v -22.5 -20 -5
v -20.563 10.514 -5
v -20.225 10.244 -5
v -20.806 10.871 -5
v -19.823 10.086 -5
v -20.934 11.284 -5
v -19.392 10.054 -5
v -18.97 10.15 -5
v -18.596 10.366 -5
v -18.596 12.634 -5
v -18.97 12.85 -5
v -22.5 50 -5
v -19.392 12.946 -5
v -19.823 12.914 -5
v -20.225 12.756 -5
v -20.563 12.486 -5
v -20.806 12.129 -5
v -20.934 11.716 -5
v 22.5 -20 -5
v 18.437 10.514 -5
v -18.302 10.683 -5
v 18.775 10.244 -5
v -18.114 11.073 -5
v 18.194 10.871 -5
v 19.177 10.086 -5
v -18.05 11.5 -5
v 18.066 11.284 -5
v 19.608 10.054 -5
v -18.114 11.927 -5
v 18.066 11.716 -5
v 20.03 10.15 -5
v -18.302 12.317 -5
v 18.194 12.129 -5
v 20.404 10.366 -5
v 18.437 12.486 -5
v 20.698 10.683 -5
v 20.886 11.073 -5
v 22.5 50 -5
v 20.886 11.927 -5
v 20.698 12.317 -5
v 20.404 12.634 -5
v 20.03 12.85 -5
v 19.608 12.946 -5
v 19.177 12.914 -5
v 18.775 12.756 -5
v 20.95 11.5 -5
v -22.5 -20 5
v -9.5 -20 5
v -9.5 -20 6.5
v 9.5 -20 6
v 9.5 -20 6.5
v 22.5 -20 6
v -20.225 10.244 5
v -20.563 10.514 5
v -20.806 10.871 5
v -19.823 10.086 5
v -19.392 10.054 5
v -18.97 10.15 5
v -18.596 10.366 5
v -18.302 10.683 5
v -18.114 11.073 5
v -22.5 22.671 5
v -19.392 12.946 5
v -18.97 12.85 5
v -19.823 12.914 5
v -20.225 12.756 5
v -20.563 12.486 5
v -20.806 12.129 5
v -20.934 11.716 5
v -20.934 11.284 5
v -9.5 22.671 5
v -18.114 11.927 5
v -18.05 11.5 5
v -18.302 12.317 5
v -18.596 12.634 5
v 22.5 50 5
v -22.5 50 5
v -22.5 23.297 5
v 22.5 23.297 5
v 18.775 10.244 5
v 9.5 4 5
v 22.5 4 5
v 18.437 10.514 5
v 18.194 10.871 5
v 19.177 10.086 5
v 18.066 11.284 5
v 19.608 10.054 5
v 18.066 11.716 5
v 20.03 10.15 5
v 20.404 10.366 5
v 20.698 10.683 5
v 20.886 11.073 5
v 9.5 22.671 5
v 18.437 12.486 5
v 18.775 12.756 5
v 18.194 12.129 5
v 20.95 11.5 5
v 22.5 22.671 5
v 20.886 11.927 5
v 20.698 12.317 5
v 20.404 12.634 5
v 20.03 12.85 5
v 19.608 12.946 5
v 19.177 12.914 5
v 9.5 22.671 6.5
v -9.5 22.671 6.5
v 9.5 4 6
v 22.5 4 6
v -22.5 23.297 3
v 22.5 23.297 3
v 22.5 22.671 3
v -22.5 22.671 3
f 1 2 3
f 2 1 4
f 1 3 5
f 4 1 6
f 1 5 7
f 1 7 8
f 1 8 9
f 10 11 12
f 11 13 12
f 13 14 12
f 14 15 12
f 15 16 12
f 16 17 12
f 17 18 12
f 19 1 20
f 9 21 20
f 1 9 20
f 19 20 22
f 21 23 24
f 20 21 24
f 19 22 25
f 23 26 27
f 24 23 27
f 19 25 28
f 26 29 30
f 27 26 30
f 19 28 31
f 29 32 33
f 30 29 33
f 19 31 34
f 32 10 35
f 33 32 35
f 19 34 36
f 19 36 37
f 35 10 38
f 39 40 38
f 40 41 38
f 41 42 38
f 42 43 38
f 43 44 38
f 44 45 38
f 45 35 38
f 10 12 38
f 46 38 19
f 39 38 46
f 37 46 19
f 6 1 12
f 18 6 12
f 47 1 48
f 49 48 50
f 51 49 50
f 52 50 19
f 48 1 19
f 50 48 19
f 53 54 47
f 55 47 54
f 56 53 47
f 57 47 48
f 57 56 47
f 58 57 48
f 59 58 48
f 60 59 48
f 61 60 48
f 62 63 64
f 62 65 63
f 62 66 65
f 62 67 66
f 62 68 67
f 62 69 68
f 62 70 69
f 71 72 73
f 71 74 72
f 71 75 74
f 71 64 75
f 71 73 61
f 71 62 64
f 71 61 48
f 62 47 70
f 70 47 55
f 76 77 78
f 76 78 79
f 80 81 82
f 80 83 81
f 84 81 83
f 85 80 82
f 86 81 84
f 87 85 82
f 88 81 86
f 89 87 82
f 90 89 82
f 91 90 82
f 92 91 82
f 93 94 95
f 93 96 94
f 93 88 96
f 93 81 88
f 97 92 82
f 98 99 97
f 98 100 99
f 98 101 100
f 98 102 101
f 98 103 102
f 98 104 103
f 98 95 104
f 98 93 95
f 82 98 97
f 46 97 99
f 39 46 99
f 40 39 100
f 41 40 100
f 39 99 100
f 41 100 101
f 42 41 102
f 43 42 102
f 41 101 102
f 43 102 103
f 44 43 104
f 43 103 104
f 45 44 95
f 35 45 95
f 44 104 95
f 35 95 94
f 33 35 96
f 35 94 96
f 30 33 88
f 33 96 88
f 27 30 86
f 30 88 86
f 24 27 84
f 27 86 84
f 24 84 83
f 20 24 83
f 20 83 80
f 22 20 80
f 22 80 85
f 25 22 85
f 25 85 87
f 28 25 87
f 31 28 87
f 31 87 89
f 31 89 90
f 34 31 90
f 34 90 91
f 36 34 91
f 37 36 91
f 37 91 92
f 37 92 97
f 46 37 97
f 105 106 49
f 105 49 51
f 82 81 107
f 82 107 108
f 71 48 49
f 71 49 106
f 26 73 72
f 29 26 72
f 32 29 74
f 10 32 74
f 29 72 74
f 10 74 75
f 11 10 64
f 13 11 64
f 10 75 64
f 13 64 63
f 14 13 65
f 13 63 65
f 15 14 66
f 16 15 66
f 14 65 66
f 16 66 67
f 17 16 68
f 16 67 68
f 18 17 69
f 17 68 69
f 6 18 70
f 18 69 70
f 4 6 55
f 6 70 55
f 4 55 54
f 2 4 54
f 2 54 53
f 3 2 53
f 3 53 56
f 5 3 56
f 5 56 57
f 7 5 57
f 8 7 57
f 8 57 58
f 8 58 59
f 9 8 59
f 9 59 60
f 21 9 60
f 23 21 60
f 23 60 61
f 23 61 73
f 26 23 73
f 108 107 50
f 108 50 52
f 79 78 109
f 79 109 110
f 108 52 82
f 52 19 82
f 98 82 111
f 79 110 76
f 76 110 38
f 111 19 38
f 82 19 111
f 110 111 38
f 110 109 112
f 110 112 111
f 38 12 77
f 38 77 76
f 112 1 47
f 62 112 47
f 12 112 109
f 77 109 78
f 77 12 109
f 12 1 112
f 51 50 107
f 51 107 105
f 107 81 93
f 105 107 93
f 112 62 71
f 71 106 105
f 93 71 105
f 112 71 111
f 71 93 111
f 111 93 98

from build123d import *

# Parameters (mm, degrees)
SKETCH2_W           = 45
SKETCH2_H           = 10
BOSS_EXTRUDE1_DEPTH = 40
SKETCH4_W           = 45
SKETCH4_H           = 10
BOSS_EXTRUDE2_DEPTH = 10
SKETCH8_W           = 45
SKETCH8_H           = 10
BOSS_EXTRUDE3_DEPTH = 20
SKETCH9_R           = 1.45
CUT_EXTRUDE2_DEPTH  = 20
SKETCH10_W          = 45
SKETCH10_H          = 0.626165357
CUT_EXTRUDE3_DEPTH  = 2
SKETCH11_W          = 19
SKETCH11_H          = 42.671327575
BOSS_EXTRUDE4_DEPTH = 1.5
SKETCH12_W          = 13
SKETCH12_H          = 24
BOSS_EXTRUDE5_DEPTH = 1


with BuildPart() as part:
    # Sketch2 → Boss-Extrude1 (new body)
    with BuildSketch(Plane(origin=(0, 0, 0), x_dir=(1, 0, 0), z_dir=(0, 1, 0))):
        Rectangle(SKETCH2_W, SKETCH2_H)
    extrude(amount=BOSS_EXTRUDE1_DEPTH)

    # Sketch4 → Boss-Extrude2 (add)
    with BuildSketch(Plane(origin=(0, 40, 0), x_dir=(1, 0, 0), z_dir=(0, 1, 0))):
        Rectangle(SKETCH4_W, SKETCH4_H)
    extrude(amount=BOSS_EXTRUDE2_DEPTH)

    # Sketch8 → Boss-Extrude3 (add)
    with BuildSketch(Plane.XZ):
        Rectangle(SKETCH8_W, SKETCH8_H)
    extrude(amount=BOSS_EXTRUDE3_DEPTH)

    # Sketch9 → Cut-Extrude2 (cut)
    with BuildSketch(Plane.XY.offset(5)):
        with Locations((19.5, 11.5)):
            Circle(SKETCH9_R)
        with Locations((-19.5, 11.5)):
            Circle(SKETCH9_R)
    extrude(amount=-CUT_EXTRUDE2_DEPTH, mode=Mode.SUBTRACT)

    # Sketch10 → Cut-Extrude3 (cut)
    with BuildSketch(Plane.XY.offset(5)):
        with Locations((0, 22.984410254)):
            Rectangle(SKETCH10_W, SKETCH10_H)
    extrude(amount=-CUT_EXTRUDE3_DEPTH, mode=Mode.SUBTRACT)

    # Sketch11 → Boss-Extrude4 (add)
    with BuildSketch(Plane.XY.offset(5)):
        with Locations((0, 1.335663788)):
            Rectangle(SKETCH11_W, SKETCH11_H)
    extrude(amount=BOSS_EXTRUDE4_DEPTH)

    # Sketch12 → Boss-Extrude5 (add)
    with BuildSketch(Plane.XY.offset(5)):
        with Locations((16, -8)):
            Rectangle(SKETCH12_W, SKETCH12_H)
    extrude(amount=BOSS_EXTRUDE5_DEPTH)


solid = part.part
